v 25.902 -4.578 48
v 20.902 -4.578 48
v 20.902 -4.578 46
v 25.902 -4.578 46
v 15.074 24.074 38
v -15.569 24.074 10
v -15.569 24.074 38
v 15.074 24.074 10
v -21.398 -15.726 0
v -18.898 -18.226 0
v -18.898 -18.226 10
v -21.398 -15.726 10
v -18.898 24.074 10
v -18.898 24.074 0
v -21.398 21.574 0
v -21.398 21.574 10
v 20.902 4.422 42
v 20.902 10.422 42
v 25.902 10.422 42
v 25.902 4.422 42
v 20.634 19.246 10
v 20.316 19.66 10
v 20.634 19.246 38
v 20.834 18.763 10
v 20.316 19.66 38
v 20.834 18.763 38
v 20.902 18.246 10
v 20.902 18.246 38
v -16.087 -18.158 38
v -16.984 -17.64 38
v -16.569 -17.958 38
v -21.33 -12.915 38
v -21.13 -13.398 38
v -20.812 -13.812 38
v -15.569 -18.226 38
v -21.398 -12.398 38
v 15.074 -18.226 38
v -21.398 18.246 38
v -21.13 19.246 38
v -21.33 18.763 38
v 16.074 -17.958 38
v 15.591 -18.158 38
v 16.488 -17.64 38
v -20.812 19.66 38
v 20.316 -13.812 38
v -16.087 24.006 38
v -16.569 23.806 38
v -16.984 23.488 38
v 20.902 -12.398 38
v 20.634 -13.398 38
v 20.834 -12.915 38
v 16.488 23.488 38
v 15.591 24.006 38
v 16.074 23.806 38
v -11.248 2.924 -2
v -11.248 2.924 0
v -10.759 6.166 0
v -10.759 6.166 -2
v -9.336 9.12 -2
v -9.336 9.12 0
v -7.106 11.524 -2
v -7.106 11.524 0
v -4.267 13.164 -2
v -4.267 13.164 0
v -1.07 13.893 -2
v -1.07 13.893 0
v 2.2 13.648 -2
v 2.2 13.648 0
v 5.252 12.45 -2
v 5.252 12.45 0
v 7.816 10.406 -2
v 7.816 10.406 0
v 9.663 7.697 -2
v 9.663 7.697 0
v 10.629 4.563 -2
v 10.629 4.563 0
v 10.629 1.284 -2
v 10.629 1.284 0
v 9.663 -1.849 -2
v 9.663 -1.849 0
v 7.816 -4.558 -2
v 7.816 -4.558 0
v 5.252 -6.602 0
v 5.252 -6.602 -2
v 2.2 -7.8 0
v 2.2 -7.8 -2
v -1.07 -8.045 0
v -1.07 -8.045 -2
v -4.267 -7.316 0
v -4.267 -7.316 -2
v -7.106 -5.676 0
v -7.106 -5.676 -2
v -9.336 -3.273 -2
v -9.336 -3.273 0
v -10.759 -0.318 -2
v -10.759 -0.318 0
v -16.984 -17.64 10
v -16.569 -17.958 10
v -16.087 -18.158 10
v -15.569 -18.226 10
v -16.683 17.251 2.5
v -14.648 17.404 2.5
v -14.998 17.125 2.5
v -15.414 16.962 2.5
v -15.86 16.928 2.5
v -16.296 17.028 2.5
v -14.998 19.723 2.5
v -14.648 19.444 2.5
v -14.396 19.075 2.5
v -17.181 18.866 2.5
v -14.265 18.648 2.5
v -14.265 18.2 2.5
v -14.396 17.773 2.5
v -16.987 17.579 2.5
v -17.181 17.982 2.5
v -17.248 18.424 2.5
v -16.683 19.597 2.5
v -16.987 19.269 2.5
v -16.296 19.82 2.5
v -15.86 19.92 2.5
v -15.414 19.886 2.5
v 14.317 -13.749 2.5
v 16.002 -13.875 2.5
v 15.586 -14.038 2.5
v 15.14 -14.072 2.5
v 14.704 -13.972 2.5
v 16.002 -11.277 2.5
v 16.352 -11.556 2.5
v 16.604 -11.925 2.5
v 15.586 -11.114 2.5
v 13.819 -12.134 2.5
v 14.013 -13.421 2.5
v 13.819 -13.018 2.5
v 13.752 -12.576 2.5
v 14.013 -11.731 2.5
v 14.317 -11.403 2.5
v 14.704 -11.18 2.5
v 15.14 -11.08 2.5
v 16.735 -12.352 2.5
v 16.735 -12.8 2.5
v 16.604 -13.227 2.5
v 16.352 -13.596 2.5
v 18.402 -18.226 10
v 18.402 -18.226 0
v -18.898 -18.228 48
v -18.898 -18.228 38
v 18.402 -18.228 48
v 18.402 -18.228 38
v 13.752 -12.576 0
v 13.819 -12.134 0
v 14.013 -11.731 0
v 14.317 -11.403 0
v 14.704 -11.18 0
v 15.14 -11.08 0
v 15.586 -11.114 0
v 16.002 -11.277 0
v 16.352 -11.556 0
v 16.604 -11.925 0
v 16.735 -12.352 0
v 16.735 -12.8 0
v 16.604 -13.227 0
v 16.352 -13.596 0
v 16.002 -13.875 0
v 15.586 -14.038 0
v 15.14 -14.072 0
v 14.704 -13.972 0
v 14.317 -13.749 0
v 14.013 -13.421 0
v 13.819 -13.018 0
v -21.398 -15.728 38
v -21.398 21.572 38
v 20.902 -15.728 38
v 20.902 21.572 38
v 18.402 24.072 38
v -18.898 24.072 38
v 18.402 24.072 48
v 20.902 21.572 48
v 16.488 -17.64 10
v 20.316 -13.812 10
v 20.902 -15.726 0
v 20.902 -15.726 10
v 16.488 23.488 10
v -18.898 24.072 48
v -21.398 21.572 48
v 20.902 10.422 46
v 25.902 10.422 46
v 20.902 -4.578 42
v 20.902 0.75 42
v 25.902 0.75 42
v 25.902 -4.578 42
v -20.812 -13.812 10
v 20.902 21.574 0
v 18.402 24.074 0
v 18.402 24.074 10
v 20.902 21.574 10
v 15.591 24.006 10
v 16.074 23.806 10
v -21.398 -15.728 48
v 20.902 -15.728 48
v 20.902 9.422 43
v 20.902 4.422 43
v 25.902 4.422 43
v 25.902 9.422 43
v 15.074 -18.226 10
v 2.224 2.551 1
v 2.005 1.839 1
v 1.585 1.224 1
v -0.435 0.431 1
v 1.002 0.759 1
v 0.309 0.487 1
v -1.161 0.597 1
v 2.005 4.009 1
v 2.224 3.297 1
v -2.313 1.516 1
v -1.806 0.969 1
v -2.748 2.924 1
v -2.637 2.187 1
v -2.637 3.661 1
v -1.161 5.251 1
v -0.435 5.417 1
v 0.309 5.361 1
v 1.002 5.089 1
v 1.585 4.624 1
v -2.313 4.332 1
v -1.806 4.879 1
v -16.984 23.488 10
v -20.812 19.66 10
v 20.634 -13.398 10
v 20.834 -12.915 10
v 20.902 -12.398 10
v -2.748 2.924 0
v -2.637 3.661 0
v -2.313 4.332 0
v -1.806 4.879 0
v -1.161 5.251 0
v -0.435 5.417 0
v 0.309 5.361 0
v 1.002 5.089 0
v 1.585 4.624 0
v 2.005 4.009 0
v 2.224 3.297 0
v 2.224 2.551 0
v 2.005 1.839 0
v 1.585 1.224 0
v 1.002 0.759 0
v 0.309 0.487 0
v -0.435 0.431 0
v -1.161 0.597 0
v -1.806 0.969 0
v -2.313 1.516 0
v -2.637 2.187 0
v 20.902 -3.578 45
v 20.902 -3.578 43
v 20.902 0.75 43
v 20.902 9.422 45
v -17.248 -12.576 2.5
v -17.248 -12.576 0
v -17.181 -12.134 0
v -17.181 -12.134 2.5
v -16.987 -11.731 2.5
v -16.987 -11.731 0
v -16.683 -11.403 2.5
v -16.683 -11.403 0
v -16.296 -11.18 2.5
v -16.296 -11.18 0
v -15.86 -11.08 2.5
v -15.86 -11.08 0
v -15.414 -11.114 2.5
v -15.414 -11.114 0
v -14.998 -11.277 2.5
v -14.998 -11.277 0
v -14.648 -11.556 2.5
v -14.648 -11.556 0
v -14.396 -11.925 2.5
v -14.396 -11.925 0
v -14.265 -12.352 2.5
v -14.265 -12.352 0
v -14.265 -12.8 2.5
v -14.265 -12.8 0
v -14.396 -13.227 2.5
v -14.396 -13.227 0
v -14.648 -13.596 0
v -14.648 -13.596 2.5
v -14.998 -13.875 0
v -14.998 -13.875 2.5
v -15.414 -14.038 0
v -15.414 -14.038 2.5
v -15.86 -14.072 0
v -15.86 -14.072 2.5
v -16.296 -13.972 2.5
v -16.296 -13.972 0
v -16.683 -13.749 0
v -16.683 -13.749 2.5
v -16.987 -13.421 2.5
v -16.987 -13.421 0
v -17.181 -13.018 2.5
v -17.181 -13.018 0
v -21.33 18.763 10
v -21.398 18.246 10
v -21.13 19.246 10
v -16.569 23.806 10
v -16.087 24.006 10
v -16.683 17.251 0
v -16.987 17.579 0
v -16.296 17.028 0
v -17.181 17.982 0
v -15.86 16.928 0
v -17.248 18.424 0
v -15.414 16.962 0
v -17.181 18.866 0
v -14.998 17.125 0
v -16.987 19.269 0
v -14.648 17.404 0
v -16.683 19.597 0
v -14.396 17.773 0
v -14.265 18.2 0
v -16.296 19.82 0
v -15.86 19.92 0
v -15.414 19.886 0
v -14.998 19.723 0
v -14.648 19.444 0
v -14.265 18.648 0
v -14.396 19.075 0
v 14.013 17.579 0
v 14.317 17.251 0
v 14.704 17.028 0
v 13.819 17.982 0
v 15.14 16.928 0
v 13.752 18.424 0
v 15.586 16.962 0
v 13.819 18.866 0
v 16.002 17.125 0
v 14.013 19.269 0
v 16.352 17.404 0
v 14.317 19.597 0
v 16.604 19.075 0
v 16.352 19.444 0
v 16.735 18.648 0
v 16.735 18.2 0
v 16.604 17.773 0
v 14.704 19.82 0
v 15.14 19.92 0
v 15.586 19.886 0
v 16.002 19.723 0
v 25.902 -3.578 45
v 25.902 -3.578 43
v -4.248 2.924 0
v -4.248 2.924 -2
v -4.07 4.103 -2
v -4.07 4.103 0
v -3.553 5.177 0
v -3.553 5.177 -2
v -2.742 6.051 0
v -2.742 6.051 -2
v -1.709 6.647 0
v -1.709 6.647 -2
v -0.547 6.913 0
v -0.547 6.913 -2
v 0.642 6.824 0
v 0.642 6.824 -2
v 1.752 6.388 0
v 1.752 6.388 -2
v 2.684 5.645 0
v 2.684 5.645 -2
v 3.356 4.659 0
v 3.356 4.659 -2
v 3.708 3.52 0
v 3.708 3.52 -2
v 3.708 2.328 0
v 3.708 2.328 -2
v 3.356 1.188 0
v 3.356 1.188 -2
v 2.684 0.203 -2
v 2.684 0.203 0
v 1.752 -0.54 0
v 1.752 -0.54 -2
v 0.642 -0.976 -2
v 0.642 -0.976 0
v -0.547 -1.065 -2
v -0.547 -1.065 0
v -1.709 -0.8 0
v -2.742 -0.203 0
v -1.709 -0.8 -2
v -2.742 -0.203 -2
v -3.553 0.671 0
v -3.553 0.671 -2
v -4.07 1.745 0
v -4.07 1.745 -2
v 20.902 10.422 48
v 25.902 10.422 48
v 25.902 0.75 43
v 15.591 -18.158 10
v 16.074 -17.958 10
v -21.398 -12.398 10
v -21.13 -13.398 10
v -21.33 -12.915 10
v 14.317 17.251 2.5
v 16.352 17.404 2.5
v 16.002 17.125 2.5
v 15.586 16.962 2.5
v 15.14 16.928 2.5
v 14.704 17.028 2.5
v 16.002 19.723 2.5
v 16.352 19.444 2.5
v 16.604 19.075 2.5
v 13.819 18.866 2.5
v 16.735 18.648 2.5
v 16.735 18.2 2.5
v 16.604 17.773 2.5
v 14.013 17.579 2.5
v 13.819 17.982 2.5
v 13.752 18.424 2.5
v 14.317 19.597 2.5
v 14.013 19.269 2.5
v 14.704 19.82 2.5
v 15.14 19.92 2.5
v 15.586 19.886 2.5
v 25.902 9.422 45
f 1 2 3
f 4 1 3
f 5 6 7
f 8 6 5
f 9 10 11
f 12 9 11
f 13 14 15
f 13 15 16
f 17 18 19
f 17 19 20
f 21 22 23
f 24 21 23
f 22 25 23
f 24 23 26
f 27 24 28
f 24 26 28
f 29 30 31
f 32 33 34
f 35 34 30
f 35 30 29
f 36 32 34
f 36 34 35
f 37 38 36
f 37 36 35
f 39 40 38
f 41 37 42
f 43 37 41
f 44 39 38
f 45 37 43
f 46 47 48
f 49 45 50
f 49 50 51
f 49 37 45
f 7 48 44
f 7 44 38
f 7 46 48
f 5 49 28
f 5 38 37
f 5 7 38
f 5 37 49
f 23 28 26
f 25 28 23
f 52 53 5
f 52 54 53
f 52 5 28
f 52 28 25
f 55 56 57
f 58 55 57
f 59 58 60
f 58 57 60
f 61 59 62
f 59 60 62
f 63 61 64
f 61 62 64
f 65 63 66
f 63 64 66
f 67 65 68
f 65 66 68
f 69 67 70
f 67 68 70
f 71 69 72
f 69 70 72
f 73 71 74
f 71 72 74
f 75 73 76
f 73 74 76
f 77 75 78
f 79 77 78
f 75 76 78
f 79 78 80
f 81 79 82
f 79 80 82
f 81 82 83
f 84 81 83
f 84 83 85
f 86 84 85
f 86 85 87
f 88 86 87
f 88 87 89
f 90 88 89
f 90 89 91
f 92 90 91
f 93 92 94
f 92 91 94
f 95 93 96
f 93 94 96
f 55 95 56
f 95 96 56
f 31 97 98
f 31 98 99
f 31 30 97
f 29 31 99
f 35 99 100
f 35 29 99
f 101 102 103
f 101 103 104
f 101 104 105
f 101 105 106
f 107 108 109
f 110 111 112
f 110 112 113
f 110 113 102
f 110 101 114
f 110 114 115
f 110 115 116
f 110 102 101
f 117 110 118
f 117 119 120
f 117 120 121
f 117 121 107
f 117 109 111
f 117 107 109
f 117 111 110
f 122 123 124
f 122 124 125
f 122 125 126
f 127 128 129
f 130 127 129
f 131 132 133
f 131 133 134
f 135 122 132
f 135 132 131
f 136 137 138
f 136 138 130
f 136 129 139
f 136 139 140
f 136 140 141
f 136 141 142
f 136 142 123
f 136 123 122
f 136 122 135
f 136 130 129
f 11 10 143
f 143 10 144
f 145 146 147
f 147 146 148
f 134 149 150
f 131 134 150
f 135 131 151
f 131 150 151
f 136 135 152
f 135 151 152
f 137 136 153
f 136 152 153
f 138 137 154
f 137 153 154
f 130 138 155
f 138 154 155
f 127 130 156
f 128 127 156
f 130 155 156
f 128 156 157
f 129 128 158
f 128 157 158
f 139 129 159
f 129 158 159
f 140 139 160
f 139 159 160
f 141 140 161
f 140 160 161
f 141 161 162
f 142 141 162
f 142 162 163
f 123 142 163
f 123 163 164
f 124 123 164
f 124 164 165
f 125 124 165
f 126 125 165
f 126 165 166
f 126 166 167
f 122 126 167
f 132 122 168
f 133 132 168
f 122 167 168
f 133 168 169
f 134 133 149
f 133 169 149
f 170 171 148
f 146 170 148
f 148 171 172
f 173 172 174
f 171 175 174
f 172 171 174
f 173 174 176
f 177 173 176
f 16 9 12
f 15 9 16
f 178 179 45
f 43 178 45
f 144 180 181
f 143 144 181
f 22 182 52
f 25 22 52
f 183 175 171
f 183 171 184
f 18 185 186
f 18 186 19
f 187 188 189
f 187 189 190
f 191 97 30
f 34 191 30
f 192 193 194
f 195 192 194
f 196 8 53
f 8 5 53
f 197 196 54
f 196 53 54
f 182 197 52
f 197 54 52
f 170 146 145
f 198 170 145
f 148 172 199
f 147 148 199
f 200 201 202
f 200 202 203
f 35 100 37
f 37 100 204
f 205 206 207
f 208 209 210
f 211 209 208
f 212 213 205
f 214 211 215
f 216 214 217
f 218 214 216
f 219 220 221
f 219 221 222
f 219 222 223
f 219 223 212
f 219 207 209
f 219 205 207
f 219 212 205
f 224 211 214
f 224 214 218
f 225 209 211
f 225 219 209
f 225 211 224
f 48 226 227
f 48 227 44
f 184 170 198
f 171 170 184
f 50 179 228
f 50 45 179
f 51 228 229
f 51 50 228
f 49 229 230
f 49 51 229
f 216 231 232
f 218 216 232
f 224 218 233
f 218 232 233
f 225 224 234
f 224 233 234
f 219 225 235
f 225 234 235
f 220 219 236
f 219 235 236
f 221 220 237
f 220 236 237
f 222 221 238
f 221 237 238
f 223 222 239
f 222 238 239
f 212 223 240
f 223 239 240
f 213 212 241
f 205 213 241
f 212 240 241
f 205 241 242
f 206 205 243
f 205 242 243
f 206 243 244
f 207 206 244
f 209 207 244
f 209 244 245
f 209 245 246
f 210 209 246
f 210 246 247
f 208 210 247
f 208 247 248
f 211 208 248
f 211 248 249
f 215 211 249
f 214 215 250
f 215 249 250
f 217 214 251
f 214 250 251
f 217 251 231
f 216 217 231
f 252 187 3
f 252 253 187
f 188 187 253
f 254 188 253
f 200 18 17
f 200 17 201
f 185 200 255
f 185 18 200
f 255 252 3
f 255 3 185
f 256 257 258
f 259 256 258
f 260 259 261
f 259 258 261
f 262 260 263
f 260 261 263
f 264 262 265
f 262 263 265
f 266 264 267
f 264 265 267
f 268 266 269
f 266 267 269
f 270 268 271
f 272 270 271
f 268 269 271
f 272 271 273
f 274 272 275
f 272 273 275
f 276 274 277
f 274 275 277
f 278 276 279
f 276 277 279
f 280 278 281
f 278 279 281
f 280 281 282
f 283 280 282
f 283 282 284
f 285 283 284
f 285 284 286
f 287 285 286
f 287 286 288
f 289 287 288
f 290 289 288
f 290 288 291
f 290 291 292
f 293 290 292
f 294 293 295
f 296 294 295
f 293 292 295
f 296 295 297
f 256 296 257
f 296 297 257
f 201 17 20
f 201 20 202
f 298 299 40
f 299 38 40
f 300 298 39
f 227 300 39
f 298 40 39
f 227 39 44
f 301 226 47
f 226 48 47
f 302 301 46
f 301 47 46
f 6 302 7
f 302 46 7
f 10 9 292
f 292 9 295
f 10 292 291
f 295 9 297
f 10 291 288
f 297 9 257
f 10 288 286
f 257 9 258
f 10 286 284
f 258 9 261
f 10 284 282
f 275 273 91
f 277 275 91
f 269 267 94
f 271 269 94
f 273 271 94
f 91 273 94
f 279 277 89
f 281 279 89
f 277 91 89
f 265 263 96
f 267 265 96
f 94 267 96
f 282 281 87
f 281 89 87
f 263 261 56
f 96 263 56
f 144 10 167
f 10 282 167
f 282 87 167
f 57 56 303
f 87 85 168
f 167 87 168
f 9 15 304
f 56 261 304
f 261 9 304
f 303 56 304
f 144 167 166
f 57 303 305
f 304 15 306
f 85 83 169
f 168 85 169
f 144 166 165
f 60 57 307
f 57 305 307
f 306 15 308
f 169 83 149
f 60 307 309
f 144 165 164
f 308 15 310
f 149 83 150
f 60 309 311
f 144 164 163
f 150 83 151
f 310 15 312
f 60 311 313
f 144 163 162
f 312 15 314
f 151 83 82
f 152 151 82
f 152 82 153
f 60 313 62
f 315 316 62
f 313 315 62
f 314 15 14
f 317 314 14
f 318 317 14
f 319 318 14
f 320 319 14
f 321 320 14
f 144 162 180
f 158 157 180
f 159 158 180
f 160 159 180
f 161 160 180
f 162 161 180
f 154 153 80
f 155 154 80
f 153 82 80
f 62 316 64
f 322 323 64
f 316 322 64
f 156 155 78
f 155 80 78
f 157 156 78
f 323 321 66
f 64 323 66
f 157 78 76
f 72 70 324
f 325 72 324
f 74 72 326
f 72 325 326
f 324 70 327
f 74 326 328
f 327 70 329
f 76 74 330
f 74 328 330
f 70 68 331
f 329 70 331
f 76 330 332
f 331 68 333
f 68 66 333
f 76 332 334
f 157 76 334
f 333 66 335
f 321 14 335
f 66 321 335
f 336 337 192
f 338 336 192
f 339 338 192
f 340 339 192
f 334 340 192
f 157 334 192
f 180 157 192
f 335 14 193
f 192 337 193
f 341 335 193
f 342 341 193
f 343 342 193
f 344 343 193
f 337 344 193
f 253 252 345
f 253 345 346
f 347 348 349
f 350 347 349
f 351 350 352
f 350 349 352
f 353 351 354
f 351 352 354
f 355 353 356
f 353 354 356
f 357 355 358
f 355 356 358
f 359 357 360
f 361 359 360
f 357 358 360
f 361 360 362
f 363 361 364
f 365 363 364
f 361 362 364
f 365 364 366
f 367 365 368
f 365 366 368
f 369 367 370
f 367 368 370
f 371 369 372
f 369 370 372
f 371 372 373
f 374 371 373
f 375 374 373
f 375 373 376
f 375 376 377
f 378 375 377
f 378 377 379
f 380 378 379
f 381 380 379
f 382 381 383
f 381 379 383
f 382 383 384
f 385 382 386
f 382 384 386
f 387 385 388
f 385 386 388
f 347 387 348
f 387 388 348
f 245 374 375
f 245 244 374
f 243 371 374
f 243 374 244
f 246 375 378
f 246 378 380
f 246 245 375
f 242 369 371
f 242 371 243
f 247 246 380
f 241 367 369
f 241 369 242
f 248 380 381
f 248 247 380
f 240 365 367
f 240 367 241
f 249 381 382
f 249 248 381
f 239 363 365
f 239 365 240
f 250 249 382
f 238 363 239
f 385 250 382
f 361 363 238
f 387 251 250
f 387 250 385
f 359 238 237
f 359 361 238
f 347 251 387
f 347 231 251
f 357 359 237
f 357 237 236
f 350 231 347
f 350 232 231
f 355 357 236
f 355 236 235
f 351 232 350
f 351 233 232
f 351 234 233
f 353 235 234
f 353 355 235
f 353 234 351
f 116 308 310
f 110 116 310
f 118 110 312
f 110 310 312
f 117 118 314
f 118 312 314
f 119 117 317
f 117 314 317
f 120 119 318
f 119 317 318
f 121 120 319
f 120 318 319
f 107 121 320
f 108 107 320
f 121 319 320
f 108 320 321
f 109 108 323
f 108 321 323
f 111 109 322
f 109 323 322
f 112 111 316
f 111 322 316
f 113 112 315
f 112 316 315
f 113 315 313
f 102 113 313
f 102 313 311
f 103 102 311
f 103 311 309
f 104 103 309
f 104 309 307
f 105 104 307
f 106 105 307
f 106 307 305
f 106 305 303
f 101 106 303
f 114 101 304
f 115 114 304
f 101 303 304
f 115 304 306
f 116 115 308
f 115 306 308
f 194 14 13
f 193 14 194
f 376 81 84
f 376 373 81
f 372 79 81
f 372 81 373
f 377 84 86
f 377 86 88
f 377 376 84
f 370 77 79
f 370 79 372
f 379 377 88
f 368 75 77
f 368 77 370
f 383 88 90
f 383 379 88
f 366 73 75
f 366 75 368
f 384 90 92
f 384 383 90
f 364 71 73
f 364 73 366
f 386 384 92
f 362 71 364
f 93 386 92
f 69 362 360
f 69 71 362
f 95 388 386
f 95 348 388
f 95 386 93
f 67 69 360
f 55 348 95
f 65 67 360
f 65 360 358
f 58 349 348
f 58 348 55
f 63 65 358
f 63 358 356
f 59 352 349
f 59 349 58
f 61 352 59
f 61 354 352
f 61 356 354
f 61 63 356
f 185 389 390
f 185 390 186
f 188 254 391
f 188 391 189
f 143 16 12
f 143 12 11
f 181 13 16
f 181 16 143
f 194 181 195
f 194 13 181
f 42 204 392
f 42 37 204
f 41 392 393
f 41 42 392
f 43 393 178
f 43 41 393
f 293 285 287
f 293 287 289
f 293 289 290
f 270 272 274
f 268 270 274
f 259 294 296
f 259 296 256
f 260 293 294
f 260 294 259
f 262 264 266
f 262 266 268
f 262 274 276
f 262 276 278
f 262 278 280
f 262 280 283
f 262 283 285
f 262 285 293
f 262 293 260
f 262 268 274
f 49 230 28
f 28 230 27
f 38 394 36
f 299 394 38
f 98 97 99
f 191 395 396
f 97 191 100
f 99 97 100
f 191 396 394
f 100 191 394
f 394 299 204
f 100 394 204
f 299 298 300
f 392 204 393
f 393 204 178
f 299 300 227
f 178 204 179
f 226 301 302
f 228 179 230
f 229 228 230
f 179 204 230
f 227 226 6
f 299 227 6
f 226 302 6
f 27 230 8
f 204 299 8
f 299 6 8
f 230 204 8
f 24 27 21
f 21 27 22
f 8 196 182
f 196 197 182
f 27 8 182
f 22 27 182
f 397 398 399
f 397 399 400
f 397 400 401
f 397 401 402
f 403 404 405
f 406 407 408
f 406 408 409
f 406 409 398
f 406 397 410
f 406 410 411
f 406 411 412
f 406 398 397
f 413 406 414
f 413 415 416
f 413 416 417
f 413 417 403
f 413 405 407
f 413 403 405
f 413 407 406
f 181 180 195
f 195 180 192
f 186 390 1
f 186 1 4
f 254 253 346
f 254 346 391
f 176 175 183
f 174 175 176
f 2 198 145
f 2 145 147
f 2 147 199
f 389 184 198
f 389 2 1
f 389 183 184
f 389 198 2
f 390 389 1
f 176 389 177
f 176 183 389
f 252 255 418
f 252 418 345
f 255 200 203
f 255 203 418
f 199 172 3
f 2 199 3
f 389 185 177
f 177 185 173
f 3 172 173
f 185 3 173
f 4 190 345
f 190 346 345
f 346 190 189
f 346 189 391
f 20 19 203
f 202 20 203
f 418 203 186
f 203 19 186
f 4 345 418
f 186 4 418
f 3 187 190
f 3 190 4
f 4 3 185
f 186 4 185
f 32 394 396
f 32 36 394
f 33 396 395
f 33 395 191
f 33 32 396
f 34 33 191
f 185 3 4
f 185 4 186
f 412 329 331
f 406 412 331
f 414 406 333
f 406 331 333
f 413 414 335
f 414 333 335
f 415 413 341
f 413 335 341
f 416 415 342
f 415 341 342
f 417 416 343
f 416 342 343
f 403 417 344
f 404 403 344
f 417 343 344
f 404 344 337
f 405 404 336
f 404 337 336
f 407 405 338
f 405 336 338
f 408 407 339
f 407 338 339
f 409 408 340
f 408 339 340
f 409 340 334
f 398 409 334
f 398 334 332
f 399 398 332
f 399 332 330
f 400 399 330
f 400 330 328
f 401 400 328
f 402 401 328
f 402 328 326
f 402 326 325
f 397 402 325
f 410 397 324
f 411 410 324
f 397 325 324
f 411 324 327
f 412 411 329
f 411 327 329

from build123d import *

# Parameters (mm, degrees)
SKETCH1_W           = 42.3
SKETCH1_H           = 42.3
BOSS_EXTRUDE2_DEPTH = 10
SKETCH2_W           = 42.3
SKETCH2_H           = 42.3
BOSS_EXTRUDE3_DEPTH = 28
CHAMFER1_SIZE       = 5
FILLET1_R           = 2
CHAMFER2_SIZE       = 2.5
SKETCH4_W           = 42.3
SKETCH4_H           = 42.3
BOSS_EXTRUDE4_DEPTH = 10
CHAMFER3_SIZE       = 2.5
SKETCH5_R           = 11
BOSS_EXTRUDE5_DEPTH = 2
SKETCH6_R           = 4
CUT_EXTRUDE1_DEPTH  = 2
SKETCH7_R           = 2.5
CUT_EXTRUDE2_DEPTH  = 1
SKETCH11_R          = 1.5
CUT_EXTRUDE3_DEPTH  = 2.5
SKETCH12_W          = 2
SKETCH12_H          = 15
BOSS_EXTRUDE6_DEPTH = 5
BOSS_EXTRUDE7_DEPTH = 5


with BuildPart() as part:
    # Sketch1 → Boss-Extrude2 (new body)
    with BuildSketch(Plane.XY):
        with Locations((-0.247770908, 2.923963134)):
            Rectangle(SKETCH1_W, SKETCH1_H)
    extrude(amount=BOSS_EXTRUDE2_DEPTH)

    # Chamfer2
    chamfer2_edges = [part.edges().sort_by_distance(p)[0] for p in [
        (-21.397770908, 24.073963134, 5),
        (20.902229092, 24.073963134, 5),
        (20.902229092, -18.226036866, 5),
        (-21.397770908, -18.226036866, 5),
    ]]
    chamfer(chamfer2_edges, length=CHAMFER2_SIZE)

    # Sketch5 → Boss-Extrude5 (add)
    with BuildSketch(Plane(origin=(0, 0, 0), x_dir=(-1, 0, 0), z_dir=(0, 0, -1))):
        with Locations((0.247770908, 2.923963134)):
            Circle(SKETCH5_R)
    extrude(amount=BOSS_EXTRUDE5_DEPTH)

    # Sketch6 → Cut-Extrude1 (cut)
    with BuildSketch(Plane(origin=(0, 0, -2), x_dir=(-1, 0, 0), z_dir=(0, 0, -1))):
        with Locations((0.247770908, 2.923963134)):
            Circle(SKETCH6_R)
    extrude(amount=-CUT_EXTRUDE1_DEPTH, mode=Mode.SUBTRACT)

    # Sketch7 → Cut-Extrude2 (cut)
    with BuildSketch(Plane(origin=(0, 0, 0), x_dir=(-1, 0, 0), z_dir=(0, 0, -1))):
        with Locations((0.247770908, 2.923963134)):
            Circle(SKETCH7_R)
    extrude(amount=-CUT_EXTRUDE2_DEPTH, mode=Mode.SUBTRACT)

    # Sketch11 → Cut-Extrude3 (cut)
    with BuildSketch(Plane(origin=(0, 0, 0), x_dir=(-1, 0, 0), z_dir=(0, 0, -1))):
        with Locations((-15.252229092, 18.423963134)):
            Circle(SKETCH11_R)
        with Locations((15.747770908, 18.423963134)):
            Circle(SKETCH11_R)
        with Locations((15.747770908, -12.576036866)):
            Circle(SKETCH11_R)
        with Locations((-15.252229092, -12.576036866)):
            Circle(SKETCH11_R)
    extrude(amount=-CUT_EXTRUDE3_DEPTH, mode=Mode.SUBTRACT)


with BuildPart() as body_2:
    # Sketch2 → Boss-Extrude3 (new body)
    with BuildSketch(Plane.XY.offset(10)):
        with Locations((-0.247770908, 2.923963134)):
            Rectangle(SKETCH2_W, SKETCH2_H)
    extrude(amount=BOSS_EXTRUDE3_DEPTH)

    # Chamfer1
    chamfer1_edges = [body_2.edges().sort_by_distance(p)[0] for p in [
        (-21.397770908, 24.073963134, 24),
        (20.902229092, 24.073963134, 24),
        (20.902229092, -18.226036866, 24),
        (-21.397770908, -18.226036866, 24),
    ]]
    chamfer(chamfer1_edges, length=CHAMFER1_SIZE)

    # Fillet1
    fillet1_edges = [body_2.edges().sort_by_distance(p)[0] for p in [
        (20.902229092, 19.073963134, 24),
        (20.902229092, -13.226036866, 24),
        (-16.397770908, -18.226036866, 24),
        (15.902229092, -18.226036866, 24),
        (-21.397770908, 19.073963134, 24),
        (-21.397770908, -13.226036866, 24),
        (15.902229092, 24.073963134, 24),
        (-16.397770908, 24.073963134, 24),
    ]]
    fillet(fillet1_edges, radius=FILLET1_R)


with BuildPart() as body_3:
    # Sketch4 → Boss-Extrude4 (new body)
    with BuildSketch(Plane.XY.offset(38)):
        with Locations((-0.247770908, 2.921958388)):
            Rectangle(SKETCH4_W, SKETCH4_H)
    extrude(amount=BOSS_EXTRUDE4_DEPTH)

    # Chamfer3
    chamfer3_edges = [body_3.edges().sort_by_distance(p)[0] for p in [
        (-21.397770908, 24.071958388, 43),
        (20.902229092, 24.071958388, 43),
        (20.902229092, -18.228041612, 43),
        (-21.397770908, -18.228041612, 43),
    ]]
    chamfer(chamfer3_edges, length=CHAMFER3_SIZE)

    # Sketch12 → Boss-Extrude6 (add)
    with BuildSketch(Plane(origin=(20.902229092, 0, 0), x_dir=(0, 0, -1), z_dir=(1, 0, 0))):
        with Locations((-47, 2.921958388)):
            Rectangle(SKETCH12_W, SKETCH12_H)
    extrude(amount=BOSS_EXTRUDE6_DEPTH)


with BuildPart() as body_4:
    # Sketch13 → Boss-Extrude7 (new body)
    with BuildSketch(Plane(origin=(20.902229092, 0, 0), x_dir=(0, 0, -1), z_dir=(1, 0, 0))):
        Polygon((-46, 10.421958388), (-42, 10.421958388), (-42, 4.421958388), (-43, 4.421958388), (-43, 9.421958388), (-45, 9.421958388), (-45, -3.578041612), (-43, -3.578041612), (-43, 0.749984504), (-42, 0.749984504), (-42, -4.578041612), (-46, -4.578041612), align=None)
    extrude(amount=BOSS_EXTRUDE7_DEPTH)


solid = Compound([part.part, body_2.part, body_3.part, body_4.part])
